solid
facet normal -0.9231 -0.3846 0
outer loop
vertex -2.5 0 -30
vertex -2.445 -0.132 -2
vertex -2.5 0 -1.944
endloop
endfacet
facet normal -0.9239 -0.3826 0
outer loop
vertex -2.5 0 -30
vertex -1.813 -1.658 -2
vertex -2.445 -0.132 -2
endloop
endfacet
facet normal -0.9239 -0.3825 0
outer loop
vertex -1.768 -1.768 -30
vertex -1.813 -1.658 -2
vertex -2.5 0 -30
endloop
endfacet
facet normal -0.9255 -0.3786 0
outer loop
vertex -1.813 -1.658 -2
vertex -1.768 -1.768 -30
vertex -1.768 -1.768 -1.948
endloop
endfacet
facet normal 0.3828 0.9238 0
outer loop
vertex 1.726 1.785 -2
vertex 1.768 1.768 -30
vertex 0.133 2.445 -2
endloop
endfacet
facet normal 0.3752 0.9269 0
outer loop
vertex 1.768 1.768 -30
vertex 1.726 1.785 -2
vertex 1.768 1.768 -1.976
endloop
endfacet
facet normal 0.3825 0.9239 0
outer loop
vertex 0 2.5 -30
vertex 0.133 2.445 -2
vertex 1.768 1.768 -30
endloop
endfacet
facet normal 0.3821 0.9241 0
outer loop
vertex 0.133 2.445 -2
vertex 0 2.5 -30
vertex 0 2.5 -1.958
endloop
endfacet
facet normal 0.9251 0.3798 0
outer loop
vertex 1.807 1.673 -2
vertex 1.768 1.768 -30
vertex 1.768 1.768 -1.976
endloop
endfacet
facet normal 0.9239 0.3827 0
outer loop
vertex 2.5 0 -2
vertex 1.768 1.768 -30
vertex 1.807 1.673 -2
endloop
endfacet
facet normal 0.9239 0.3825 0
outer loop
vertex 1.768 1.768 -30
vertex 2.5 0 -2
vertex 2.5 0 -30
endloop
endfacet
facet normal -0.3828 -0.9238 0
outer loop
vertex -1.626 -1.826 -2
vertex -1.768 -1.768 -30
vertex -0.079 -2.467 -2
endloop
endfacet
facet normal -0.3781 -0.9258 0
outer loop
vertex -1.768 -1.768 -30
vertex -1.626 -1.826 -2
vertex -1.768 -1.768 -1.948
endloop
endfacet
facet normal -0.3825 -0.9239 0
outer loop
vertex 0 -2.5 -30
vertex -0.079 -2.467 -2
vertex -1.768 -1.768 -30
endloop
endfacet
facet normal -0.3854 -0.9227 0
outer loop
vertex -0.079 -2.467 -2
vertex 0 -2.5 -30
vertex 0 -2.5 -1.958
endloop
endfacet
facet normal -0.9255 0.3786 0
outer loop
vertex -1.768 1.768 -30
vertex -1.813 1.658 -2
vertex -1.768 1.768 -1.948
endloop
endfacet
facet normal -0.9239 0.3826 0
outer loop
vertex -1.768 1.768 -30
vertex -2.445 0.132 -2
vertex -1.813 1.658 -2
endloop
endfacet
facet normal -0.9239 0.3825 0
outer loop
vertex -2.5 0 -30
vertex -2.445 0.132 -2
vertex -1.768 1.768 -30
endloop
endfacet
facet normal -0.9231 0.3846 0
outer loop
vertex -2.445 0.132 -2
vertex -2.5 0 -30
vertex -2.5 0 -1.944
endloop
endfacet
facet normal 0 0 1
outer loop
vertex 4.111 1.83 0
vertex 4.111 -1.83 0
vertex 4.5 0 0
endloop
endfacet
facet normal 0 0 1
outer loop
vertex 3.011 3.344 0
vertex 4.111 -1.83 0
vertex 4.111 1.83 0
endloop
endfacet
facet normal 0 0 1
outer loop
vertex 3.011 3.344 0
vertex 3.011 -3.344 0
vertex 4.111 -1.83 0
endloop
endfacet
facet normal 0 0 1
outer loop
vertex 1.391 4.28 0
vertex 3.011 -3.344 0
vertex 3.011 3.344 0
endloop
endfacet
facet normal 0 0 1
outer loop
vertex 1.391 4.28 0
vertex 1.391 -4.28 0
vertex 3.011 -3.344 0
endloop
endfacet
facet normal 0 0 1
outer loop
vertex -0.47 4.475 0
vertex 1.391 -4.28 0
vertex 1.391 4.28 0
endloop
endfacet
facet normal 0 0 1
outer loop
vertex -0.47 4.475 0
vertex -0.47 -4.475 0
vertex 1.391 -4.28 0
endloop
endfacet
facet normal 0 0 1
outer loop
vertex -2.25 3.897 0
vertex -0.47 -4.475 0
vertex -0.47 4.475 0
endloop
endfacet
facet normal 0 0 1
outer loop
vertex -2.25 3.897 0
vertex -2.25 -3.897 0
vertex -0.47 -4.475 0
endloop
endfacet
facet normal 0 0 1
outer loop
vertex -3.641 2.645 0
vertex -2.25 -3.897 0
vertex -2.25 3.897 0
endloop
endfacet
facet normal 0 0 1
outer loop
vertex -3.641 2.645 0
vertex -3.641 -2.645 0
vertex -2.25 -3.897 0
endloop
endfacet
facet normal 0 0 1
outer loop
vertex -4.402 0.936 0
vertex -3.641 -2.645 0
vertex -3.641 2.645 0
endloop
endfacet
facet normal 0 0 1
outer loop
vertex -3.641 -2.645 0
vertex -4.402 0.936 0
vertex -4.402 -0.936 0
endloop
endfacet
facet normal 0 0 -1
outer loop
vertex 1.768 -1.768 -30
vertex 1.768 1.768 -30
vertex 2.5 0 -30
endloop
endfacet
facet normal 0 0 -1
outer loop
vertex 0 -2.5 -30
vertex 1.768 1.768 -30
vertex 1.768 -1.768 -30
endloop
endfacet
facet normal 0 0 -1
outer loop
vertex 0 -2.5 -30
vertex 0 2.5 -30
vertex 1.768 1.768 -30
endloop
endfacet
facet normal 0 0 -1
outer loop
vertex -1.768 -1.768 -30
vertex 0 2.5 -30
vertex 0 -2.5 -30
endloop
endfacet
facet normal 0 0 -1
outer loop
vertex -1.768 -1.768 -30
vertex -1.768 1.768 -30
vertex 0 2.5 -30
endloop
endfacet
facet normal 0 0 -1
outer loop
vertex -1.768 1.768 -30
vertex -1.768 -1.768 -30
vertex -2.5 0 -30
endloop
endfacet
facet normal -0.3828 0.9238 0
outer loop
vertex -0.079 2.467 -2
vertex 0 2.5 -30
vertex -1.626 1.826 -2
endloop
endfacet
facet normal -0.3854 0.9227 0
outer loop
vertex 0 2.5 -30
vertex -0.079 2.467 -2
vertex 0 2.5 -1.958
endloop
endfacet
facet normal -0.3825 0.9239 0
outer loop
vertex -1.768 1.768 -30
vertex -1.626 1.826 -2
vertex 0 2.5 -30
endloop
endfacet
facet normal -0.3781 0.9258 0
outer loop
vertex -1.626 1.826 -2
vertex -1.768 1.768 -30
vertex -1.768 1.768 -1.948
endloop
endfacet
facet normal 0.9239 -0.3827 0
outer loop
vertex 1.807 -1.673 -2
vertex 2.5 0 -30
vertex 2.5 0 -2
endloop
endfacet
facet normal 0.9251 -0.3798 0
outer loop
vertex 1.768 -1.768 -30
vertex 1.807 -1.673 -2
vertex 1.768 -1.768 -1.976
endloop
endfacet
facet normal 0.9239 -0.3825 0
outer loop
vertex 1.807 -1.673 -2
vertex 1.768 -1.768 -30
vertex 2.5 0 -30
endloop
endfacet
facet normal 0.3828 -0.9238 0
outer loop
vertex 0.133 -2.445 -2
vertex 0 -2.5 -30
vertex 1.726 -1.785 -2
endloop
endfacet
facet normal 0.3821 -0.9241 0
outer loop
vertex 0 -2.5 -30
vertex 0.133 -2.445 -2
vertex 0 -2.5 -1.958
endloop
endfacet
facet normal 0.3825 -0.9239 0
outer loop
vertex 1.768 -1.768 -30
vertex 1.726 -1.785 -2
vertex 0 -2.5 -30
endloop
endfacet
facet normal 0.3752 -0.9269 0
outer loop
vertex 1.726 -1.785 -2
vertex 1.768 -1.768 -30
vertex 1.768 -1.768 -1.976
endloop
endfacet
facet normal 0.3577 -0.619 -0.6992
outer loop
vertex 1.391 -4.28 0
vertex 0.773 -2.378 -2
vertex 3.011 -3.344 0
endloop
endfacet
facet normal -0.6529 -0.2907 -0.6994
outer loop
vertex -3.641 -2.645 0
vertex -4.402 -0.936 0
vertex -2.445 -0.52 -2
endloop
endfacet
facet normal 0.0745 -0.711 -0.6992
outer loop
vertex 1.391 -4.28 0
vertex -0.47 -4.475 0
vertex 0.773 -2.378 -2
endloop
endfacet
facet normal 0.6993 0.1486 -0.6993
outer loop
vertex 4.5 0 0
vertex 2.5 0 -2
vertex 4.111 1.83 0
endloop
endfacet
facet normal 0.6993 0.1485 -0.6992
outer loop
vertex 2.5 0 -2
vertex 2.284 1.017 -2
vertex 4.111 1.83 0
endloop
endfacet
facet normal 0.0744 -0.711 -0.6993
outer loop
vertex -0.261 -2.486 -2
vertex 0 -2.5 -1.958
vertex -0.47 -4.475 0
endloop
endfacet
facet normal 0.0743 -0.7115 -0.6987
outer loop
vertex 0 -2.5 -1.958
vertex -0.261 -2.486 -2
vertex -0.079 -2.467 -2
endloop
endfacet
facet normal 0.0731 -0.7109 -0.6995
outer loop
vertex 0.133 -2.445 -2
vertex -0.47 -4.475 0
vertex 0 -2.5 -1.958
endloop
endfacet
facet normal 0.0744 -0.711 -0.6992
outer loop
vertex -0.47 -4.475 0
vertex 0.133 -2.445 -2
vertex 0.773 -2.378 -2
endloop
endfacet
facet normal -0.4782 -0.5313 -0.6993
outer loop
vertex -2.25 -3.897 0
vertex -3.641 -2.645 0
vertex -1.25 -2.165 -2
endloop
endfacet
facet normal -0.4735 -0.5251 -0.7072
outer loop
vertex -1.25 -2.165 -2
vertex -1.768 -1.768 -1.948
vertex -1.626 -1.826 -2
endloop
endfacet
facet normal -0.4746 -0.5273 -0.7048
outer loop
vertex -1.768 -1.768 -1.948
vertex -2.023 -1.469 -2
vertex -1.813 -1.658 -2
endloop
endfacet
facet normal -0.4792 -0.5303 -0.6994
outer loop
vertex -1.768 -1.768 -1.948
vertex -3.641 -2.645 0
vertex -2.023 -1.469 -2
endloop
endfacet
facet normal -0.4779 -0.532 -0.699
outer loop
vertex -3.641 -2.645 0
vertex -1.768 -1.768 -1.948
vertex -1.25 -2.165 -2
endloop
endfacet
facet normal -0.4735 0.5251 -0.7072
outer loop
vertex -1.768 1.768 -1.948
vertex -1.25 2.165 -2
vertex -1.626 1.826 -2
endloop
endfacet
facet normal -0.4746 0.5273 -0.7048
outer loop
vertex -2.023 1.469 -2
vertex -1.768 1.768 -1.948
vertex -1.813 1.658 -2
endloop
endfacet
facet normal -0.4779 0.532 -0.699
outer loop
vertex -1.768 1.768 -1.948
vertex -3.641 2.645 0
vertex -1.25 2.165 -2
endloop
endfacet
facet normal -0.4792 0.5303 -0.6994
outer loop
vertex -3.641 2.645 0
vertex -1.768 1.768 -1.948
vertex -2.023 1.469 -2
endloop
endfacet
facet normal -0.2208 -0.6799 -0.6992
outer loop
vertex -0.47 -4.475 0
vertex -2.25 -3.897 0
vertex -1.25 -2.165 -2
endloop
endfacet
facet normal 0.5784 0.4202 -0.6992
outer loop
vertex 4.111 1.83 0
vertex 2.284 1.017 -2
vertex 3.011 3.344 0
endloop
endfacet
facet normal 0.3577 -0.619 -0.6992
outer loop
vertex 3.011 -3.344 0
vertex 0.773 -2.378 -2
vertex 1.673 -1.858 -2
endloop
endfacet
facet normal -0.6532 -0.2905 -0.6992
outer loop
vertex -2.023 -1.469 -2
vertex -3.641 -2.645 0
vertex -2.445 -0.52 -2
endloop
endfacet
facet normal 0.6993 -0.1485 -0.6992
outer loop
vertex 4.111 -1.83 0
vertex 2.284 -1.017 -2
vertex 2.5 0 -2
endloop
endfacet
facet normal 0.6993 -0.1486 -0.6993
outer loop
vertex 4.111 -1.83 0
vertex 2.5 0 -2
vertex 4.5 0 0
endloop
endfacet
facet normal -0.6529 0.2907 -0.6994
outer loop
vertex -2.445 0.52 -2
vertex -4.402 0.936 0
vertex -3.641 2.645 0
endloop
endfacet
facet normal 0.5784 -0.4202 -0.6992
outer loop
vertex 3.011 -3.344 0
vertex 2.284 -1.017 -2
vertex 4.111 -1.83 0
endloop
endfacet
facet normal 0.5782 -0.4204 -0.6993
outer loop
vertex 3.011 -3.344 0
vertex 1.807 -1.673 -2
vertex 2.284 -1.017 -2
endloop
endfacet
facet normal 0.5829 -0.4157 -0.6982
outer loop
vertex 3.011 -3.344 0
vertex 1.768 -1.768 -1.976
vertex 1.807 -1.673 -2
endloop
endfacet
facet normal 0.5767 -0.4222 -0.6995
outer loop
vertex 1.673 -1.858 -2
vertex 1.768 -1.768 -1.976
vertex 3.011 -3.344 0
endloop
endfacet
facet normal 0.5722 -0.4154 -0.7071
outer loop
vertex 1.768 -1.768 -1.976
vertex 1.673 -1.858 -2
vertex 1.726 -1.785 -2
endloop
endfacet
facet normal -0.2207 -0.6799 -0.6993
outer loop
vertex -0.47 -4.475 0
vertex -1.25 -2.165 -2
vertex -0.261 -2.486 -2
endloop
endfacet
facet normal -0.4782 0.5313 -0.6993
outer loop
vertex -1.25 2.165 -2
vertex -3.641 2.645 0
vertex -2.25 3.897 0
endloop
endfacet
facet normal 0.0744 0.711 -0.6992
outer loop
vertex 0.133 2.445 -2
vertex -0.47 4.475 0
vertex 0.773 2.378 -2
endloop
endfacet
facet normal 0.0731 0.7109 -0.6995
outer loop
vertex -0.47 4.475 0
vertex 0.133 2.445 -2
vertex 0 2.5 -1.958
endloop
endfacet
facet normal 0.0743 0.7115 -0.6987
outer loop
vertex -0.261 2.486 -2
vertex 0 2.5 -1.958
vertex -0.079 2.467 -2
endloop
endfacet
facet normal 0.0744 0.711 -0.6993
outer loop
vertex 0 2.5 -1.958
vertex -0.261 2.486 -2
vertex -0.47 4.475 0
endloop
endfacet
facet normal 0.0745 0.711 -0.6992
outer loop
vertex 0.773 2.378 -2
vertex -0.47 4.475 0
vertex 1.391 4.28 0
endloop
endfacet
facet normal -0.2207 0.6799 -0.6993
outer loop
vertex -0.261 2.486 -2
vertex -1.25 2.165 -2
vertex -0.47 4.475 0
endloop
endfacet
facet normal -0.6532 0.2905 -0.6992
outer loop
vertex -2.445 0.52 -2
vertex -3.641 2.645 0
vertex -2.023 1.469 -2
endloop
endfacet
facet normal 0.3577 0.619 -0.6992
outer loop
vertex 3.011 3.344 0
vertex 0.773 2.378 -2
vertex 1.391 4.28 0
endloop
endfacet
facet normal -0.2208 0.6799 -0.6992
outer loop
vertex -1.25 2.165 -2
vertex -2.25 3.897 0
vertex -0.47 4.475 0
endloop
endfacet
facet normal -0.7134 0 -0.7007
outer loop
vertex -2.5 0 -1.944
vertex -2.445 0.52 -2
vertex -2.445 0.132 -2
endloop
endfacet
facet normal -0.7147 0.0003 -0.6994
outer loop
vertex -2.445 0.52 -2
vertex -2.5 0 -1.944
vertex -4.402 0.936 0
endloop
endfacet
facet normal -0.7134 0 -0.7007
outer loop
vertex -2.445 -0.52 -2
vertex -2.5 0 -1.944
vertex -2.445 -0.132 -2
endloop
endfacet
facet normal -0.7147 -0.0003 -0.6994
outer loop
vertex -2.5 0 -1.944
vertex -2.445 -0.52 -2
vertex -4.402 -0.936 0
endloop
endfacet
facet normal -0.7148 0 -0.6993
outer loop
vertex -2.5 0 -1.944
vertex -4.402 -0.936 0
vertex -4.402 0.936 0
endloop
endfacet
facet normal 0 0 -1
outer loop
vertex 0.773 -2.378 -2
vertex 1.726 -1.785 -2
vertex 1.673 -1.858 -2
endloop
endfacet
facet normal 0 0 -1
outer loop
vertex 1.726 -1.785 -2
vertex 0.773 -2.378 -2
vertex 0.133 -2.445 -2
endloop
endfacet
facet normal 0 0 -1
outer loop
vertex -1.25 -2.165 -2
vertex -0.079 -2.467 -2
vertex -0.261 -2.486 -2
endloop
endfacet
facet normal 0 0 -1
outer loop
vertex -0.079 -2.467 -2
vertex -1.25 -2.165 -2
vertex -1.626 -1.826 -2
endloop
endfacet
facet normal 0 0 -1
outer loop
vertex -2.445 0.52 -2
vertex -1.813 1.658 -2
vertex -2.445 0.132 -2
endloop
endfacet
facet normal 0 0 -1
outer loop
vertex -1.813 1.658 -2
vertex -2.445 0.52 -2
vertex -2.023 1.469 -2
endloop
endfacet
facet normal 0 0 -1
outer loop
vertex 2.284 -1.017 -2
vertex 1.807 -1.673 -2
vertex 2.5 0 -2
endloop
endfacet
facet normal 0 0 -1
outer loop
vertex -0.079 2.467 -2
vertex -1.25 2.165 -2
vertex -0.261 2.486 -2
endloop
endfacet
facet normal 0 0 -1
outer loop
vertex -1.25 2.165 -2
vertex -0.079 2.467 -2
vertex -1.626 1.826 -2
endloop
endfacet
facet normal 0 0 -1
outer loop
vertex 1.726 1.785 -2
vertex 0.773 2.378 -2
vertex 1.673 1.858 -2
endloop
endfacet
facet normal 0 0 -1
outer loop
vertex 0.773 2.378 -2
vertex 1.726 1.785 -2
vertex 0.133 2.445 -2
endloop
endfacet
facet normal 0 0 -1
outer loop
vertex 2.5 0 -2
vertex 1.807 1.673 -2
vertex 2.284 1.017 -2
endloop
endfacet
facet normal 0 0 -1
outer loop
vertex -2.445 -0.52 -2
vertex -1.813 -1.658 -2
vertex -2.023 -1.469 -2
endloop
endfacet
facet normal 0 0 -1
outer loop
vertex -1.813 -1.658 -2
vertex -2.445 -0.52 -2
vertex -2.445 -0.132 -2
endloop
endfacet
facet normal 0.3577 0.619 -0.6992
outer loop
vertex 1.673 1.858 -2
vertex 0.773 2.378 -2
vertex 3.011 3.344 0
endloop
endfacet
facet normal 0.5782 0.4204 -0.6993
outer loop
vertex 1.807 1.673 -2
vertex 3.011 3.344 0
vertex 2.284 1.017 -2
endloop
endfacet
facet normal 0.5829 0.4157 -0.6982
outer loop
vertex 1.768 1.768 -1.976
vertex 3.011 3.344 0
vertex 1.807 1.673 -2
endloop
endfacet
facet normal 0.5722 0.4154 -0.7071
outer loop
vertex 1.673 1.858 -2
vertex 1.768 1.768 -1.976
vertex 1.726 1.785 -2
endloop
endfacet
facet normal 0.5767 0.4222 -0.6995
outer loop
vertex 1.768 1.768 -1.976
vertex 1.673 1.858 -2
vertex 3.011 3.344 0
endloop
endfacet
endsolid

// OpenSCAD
module screw(diameter = 10, head_height = 5, h = 30) {
    translate([0, 0, -h]) cylinder(h=h, r = diameter/2);
    translate([0, 0, -head_height]) cylinder(h=head_height, r1 = diameter/2, r2 = diameter/2 + head_height);
}

screw(5, 2);
